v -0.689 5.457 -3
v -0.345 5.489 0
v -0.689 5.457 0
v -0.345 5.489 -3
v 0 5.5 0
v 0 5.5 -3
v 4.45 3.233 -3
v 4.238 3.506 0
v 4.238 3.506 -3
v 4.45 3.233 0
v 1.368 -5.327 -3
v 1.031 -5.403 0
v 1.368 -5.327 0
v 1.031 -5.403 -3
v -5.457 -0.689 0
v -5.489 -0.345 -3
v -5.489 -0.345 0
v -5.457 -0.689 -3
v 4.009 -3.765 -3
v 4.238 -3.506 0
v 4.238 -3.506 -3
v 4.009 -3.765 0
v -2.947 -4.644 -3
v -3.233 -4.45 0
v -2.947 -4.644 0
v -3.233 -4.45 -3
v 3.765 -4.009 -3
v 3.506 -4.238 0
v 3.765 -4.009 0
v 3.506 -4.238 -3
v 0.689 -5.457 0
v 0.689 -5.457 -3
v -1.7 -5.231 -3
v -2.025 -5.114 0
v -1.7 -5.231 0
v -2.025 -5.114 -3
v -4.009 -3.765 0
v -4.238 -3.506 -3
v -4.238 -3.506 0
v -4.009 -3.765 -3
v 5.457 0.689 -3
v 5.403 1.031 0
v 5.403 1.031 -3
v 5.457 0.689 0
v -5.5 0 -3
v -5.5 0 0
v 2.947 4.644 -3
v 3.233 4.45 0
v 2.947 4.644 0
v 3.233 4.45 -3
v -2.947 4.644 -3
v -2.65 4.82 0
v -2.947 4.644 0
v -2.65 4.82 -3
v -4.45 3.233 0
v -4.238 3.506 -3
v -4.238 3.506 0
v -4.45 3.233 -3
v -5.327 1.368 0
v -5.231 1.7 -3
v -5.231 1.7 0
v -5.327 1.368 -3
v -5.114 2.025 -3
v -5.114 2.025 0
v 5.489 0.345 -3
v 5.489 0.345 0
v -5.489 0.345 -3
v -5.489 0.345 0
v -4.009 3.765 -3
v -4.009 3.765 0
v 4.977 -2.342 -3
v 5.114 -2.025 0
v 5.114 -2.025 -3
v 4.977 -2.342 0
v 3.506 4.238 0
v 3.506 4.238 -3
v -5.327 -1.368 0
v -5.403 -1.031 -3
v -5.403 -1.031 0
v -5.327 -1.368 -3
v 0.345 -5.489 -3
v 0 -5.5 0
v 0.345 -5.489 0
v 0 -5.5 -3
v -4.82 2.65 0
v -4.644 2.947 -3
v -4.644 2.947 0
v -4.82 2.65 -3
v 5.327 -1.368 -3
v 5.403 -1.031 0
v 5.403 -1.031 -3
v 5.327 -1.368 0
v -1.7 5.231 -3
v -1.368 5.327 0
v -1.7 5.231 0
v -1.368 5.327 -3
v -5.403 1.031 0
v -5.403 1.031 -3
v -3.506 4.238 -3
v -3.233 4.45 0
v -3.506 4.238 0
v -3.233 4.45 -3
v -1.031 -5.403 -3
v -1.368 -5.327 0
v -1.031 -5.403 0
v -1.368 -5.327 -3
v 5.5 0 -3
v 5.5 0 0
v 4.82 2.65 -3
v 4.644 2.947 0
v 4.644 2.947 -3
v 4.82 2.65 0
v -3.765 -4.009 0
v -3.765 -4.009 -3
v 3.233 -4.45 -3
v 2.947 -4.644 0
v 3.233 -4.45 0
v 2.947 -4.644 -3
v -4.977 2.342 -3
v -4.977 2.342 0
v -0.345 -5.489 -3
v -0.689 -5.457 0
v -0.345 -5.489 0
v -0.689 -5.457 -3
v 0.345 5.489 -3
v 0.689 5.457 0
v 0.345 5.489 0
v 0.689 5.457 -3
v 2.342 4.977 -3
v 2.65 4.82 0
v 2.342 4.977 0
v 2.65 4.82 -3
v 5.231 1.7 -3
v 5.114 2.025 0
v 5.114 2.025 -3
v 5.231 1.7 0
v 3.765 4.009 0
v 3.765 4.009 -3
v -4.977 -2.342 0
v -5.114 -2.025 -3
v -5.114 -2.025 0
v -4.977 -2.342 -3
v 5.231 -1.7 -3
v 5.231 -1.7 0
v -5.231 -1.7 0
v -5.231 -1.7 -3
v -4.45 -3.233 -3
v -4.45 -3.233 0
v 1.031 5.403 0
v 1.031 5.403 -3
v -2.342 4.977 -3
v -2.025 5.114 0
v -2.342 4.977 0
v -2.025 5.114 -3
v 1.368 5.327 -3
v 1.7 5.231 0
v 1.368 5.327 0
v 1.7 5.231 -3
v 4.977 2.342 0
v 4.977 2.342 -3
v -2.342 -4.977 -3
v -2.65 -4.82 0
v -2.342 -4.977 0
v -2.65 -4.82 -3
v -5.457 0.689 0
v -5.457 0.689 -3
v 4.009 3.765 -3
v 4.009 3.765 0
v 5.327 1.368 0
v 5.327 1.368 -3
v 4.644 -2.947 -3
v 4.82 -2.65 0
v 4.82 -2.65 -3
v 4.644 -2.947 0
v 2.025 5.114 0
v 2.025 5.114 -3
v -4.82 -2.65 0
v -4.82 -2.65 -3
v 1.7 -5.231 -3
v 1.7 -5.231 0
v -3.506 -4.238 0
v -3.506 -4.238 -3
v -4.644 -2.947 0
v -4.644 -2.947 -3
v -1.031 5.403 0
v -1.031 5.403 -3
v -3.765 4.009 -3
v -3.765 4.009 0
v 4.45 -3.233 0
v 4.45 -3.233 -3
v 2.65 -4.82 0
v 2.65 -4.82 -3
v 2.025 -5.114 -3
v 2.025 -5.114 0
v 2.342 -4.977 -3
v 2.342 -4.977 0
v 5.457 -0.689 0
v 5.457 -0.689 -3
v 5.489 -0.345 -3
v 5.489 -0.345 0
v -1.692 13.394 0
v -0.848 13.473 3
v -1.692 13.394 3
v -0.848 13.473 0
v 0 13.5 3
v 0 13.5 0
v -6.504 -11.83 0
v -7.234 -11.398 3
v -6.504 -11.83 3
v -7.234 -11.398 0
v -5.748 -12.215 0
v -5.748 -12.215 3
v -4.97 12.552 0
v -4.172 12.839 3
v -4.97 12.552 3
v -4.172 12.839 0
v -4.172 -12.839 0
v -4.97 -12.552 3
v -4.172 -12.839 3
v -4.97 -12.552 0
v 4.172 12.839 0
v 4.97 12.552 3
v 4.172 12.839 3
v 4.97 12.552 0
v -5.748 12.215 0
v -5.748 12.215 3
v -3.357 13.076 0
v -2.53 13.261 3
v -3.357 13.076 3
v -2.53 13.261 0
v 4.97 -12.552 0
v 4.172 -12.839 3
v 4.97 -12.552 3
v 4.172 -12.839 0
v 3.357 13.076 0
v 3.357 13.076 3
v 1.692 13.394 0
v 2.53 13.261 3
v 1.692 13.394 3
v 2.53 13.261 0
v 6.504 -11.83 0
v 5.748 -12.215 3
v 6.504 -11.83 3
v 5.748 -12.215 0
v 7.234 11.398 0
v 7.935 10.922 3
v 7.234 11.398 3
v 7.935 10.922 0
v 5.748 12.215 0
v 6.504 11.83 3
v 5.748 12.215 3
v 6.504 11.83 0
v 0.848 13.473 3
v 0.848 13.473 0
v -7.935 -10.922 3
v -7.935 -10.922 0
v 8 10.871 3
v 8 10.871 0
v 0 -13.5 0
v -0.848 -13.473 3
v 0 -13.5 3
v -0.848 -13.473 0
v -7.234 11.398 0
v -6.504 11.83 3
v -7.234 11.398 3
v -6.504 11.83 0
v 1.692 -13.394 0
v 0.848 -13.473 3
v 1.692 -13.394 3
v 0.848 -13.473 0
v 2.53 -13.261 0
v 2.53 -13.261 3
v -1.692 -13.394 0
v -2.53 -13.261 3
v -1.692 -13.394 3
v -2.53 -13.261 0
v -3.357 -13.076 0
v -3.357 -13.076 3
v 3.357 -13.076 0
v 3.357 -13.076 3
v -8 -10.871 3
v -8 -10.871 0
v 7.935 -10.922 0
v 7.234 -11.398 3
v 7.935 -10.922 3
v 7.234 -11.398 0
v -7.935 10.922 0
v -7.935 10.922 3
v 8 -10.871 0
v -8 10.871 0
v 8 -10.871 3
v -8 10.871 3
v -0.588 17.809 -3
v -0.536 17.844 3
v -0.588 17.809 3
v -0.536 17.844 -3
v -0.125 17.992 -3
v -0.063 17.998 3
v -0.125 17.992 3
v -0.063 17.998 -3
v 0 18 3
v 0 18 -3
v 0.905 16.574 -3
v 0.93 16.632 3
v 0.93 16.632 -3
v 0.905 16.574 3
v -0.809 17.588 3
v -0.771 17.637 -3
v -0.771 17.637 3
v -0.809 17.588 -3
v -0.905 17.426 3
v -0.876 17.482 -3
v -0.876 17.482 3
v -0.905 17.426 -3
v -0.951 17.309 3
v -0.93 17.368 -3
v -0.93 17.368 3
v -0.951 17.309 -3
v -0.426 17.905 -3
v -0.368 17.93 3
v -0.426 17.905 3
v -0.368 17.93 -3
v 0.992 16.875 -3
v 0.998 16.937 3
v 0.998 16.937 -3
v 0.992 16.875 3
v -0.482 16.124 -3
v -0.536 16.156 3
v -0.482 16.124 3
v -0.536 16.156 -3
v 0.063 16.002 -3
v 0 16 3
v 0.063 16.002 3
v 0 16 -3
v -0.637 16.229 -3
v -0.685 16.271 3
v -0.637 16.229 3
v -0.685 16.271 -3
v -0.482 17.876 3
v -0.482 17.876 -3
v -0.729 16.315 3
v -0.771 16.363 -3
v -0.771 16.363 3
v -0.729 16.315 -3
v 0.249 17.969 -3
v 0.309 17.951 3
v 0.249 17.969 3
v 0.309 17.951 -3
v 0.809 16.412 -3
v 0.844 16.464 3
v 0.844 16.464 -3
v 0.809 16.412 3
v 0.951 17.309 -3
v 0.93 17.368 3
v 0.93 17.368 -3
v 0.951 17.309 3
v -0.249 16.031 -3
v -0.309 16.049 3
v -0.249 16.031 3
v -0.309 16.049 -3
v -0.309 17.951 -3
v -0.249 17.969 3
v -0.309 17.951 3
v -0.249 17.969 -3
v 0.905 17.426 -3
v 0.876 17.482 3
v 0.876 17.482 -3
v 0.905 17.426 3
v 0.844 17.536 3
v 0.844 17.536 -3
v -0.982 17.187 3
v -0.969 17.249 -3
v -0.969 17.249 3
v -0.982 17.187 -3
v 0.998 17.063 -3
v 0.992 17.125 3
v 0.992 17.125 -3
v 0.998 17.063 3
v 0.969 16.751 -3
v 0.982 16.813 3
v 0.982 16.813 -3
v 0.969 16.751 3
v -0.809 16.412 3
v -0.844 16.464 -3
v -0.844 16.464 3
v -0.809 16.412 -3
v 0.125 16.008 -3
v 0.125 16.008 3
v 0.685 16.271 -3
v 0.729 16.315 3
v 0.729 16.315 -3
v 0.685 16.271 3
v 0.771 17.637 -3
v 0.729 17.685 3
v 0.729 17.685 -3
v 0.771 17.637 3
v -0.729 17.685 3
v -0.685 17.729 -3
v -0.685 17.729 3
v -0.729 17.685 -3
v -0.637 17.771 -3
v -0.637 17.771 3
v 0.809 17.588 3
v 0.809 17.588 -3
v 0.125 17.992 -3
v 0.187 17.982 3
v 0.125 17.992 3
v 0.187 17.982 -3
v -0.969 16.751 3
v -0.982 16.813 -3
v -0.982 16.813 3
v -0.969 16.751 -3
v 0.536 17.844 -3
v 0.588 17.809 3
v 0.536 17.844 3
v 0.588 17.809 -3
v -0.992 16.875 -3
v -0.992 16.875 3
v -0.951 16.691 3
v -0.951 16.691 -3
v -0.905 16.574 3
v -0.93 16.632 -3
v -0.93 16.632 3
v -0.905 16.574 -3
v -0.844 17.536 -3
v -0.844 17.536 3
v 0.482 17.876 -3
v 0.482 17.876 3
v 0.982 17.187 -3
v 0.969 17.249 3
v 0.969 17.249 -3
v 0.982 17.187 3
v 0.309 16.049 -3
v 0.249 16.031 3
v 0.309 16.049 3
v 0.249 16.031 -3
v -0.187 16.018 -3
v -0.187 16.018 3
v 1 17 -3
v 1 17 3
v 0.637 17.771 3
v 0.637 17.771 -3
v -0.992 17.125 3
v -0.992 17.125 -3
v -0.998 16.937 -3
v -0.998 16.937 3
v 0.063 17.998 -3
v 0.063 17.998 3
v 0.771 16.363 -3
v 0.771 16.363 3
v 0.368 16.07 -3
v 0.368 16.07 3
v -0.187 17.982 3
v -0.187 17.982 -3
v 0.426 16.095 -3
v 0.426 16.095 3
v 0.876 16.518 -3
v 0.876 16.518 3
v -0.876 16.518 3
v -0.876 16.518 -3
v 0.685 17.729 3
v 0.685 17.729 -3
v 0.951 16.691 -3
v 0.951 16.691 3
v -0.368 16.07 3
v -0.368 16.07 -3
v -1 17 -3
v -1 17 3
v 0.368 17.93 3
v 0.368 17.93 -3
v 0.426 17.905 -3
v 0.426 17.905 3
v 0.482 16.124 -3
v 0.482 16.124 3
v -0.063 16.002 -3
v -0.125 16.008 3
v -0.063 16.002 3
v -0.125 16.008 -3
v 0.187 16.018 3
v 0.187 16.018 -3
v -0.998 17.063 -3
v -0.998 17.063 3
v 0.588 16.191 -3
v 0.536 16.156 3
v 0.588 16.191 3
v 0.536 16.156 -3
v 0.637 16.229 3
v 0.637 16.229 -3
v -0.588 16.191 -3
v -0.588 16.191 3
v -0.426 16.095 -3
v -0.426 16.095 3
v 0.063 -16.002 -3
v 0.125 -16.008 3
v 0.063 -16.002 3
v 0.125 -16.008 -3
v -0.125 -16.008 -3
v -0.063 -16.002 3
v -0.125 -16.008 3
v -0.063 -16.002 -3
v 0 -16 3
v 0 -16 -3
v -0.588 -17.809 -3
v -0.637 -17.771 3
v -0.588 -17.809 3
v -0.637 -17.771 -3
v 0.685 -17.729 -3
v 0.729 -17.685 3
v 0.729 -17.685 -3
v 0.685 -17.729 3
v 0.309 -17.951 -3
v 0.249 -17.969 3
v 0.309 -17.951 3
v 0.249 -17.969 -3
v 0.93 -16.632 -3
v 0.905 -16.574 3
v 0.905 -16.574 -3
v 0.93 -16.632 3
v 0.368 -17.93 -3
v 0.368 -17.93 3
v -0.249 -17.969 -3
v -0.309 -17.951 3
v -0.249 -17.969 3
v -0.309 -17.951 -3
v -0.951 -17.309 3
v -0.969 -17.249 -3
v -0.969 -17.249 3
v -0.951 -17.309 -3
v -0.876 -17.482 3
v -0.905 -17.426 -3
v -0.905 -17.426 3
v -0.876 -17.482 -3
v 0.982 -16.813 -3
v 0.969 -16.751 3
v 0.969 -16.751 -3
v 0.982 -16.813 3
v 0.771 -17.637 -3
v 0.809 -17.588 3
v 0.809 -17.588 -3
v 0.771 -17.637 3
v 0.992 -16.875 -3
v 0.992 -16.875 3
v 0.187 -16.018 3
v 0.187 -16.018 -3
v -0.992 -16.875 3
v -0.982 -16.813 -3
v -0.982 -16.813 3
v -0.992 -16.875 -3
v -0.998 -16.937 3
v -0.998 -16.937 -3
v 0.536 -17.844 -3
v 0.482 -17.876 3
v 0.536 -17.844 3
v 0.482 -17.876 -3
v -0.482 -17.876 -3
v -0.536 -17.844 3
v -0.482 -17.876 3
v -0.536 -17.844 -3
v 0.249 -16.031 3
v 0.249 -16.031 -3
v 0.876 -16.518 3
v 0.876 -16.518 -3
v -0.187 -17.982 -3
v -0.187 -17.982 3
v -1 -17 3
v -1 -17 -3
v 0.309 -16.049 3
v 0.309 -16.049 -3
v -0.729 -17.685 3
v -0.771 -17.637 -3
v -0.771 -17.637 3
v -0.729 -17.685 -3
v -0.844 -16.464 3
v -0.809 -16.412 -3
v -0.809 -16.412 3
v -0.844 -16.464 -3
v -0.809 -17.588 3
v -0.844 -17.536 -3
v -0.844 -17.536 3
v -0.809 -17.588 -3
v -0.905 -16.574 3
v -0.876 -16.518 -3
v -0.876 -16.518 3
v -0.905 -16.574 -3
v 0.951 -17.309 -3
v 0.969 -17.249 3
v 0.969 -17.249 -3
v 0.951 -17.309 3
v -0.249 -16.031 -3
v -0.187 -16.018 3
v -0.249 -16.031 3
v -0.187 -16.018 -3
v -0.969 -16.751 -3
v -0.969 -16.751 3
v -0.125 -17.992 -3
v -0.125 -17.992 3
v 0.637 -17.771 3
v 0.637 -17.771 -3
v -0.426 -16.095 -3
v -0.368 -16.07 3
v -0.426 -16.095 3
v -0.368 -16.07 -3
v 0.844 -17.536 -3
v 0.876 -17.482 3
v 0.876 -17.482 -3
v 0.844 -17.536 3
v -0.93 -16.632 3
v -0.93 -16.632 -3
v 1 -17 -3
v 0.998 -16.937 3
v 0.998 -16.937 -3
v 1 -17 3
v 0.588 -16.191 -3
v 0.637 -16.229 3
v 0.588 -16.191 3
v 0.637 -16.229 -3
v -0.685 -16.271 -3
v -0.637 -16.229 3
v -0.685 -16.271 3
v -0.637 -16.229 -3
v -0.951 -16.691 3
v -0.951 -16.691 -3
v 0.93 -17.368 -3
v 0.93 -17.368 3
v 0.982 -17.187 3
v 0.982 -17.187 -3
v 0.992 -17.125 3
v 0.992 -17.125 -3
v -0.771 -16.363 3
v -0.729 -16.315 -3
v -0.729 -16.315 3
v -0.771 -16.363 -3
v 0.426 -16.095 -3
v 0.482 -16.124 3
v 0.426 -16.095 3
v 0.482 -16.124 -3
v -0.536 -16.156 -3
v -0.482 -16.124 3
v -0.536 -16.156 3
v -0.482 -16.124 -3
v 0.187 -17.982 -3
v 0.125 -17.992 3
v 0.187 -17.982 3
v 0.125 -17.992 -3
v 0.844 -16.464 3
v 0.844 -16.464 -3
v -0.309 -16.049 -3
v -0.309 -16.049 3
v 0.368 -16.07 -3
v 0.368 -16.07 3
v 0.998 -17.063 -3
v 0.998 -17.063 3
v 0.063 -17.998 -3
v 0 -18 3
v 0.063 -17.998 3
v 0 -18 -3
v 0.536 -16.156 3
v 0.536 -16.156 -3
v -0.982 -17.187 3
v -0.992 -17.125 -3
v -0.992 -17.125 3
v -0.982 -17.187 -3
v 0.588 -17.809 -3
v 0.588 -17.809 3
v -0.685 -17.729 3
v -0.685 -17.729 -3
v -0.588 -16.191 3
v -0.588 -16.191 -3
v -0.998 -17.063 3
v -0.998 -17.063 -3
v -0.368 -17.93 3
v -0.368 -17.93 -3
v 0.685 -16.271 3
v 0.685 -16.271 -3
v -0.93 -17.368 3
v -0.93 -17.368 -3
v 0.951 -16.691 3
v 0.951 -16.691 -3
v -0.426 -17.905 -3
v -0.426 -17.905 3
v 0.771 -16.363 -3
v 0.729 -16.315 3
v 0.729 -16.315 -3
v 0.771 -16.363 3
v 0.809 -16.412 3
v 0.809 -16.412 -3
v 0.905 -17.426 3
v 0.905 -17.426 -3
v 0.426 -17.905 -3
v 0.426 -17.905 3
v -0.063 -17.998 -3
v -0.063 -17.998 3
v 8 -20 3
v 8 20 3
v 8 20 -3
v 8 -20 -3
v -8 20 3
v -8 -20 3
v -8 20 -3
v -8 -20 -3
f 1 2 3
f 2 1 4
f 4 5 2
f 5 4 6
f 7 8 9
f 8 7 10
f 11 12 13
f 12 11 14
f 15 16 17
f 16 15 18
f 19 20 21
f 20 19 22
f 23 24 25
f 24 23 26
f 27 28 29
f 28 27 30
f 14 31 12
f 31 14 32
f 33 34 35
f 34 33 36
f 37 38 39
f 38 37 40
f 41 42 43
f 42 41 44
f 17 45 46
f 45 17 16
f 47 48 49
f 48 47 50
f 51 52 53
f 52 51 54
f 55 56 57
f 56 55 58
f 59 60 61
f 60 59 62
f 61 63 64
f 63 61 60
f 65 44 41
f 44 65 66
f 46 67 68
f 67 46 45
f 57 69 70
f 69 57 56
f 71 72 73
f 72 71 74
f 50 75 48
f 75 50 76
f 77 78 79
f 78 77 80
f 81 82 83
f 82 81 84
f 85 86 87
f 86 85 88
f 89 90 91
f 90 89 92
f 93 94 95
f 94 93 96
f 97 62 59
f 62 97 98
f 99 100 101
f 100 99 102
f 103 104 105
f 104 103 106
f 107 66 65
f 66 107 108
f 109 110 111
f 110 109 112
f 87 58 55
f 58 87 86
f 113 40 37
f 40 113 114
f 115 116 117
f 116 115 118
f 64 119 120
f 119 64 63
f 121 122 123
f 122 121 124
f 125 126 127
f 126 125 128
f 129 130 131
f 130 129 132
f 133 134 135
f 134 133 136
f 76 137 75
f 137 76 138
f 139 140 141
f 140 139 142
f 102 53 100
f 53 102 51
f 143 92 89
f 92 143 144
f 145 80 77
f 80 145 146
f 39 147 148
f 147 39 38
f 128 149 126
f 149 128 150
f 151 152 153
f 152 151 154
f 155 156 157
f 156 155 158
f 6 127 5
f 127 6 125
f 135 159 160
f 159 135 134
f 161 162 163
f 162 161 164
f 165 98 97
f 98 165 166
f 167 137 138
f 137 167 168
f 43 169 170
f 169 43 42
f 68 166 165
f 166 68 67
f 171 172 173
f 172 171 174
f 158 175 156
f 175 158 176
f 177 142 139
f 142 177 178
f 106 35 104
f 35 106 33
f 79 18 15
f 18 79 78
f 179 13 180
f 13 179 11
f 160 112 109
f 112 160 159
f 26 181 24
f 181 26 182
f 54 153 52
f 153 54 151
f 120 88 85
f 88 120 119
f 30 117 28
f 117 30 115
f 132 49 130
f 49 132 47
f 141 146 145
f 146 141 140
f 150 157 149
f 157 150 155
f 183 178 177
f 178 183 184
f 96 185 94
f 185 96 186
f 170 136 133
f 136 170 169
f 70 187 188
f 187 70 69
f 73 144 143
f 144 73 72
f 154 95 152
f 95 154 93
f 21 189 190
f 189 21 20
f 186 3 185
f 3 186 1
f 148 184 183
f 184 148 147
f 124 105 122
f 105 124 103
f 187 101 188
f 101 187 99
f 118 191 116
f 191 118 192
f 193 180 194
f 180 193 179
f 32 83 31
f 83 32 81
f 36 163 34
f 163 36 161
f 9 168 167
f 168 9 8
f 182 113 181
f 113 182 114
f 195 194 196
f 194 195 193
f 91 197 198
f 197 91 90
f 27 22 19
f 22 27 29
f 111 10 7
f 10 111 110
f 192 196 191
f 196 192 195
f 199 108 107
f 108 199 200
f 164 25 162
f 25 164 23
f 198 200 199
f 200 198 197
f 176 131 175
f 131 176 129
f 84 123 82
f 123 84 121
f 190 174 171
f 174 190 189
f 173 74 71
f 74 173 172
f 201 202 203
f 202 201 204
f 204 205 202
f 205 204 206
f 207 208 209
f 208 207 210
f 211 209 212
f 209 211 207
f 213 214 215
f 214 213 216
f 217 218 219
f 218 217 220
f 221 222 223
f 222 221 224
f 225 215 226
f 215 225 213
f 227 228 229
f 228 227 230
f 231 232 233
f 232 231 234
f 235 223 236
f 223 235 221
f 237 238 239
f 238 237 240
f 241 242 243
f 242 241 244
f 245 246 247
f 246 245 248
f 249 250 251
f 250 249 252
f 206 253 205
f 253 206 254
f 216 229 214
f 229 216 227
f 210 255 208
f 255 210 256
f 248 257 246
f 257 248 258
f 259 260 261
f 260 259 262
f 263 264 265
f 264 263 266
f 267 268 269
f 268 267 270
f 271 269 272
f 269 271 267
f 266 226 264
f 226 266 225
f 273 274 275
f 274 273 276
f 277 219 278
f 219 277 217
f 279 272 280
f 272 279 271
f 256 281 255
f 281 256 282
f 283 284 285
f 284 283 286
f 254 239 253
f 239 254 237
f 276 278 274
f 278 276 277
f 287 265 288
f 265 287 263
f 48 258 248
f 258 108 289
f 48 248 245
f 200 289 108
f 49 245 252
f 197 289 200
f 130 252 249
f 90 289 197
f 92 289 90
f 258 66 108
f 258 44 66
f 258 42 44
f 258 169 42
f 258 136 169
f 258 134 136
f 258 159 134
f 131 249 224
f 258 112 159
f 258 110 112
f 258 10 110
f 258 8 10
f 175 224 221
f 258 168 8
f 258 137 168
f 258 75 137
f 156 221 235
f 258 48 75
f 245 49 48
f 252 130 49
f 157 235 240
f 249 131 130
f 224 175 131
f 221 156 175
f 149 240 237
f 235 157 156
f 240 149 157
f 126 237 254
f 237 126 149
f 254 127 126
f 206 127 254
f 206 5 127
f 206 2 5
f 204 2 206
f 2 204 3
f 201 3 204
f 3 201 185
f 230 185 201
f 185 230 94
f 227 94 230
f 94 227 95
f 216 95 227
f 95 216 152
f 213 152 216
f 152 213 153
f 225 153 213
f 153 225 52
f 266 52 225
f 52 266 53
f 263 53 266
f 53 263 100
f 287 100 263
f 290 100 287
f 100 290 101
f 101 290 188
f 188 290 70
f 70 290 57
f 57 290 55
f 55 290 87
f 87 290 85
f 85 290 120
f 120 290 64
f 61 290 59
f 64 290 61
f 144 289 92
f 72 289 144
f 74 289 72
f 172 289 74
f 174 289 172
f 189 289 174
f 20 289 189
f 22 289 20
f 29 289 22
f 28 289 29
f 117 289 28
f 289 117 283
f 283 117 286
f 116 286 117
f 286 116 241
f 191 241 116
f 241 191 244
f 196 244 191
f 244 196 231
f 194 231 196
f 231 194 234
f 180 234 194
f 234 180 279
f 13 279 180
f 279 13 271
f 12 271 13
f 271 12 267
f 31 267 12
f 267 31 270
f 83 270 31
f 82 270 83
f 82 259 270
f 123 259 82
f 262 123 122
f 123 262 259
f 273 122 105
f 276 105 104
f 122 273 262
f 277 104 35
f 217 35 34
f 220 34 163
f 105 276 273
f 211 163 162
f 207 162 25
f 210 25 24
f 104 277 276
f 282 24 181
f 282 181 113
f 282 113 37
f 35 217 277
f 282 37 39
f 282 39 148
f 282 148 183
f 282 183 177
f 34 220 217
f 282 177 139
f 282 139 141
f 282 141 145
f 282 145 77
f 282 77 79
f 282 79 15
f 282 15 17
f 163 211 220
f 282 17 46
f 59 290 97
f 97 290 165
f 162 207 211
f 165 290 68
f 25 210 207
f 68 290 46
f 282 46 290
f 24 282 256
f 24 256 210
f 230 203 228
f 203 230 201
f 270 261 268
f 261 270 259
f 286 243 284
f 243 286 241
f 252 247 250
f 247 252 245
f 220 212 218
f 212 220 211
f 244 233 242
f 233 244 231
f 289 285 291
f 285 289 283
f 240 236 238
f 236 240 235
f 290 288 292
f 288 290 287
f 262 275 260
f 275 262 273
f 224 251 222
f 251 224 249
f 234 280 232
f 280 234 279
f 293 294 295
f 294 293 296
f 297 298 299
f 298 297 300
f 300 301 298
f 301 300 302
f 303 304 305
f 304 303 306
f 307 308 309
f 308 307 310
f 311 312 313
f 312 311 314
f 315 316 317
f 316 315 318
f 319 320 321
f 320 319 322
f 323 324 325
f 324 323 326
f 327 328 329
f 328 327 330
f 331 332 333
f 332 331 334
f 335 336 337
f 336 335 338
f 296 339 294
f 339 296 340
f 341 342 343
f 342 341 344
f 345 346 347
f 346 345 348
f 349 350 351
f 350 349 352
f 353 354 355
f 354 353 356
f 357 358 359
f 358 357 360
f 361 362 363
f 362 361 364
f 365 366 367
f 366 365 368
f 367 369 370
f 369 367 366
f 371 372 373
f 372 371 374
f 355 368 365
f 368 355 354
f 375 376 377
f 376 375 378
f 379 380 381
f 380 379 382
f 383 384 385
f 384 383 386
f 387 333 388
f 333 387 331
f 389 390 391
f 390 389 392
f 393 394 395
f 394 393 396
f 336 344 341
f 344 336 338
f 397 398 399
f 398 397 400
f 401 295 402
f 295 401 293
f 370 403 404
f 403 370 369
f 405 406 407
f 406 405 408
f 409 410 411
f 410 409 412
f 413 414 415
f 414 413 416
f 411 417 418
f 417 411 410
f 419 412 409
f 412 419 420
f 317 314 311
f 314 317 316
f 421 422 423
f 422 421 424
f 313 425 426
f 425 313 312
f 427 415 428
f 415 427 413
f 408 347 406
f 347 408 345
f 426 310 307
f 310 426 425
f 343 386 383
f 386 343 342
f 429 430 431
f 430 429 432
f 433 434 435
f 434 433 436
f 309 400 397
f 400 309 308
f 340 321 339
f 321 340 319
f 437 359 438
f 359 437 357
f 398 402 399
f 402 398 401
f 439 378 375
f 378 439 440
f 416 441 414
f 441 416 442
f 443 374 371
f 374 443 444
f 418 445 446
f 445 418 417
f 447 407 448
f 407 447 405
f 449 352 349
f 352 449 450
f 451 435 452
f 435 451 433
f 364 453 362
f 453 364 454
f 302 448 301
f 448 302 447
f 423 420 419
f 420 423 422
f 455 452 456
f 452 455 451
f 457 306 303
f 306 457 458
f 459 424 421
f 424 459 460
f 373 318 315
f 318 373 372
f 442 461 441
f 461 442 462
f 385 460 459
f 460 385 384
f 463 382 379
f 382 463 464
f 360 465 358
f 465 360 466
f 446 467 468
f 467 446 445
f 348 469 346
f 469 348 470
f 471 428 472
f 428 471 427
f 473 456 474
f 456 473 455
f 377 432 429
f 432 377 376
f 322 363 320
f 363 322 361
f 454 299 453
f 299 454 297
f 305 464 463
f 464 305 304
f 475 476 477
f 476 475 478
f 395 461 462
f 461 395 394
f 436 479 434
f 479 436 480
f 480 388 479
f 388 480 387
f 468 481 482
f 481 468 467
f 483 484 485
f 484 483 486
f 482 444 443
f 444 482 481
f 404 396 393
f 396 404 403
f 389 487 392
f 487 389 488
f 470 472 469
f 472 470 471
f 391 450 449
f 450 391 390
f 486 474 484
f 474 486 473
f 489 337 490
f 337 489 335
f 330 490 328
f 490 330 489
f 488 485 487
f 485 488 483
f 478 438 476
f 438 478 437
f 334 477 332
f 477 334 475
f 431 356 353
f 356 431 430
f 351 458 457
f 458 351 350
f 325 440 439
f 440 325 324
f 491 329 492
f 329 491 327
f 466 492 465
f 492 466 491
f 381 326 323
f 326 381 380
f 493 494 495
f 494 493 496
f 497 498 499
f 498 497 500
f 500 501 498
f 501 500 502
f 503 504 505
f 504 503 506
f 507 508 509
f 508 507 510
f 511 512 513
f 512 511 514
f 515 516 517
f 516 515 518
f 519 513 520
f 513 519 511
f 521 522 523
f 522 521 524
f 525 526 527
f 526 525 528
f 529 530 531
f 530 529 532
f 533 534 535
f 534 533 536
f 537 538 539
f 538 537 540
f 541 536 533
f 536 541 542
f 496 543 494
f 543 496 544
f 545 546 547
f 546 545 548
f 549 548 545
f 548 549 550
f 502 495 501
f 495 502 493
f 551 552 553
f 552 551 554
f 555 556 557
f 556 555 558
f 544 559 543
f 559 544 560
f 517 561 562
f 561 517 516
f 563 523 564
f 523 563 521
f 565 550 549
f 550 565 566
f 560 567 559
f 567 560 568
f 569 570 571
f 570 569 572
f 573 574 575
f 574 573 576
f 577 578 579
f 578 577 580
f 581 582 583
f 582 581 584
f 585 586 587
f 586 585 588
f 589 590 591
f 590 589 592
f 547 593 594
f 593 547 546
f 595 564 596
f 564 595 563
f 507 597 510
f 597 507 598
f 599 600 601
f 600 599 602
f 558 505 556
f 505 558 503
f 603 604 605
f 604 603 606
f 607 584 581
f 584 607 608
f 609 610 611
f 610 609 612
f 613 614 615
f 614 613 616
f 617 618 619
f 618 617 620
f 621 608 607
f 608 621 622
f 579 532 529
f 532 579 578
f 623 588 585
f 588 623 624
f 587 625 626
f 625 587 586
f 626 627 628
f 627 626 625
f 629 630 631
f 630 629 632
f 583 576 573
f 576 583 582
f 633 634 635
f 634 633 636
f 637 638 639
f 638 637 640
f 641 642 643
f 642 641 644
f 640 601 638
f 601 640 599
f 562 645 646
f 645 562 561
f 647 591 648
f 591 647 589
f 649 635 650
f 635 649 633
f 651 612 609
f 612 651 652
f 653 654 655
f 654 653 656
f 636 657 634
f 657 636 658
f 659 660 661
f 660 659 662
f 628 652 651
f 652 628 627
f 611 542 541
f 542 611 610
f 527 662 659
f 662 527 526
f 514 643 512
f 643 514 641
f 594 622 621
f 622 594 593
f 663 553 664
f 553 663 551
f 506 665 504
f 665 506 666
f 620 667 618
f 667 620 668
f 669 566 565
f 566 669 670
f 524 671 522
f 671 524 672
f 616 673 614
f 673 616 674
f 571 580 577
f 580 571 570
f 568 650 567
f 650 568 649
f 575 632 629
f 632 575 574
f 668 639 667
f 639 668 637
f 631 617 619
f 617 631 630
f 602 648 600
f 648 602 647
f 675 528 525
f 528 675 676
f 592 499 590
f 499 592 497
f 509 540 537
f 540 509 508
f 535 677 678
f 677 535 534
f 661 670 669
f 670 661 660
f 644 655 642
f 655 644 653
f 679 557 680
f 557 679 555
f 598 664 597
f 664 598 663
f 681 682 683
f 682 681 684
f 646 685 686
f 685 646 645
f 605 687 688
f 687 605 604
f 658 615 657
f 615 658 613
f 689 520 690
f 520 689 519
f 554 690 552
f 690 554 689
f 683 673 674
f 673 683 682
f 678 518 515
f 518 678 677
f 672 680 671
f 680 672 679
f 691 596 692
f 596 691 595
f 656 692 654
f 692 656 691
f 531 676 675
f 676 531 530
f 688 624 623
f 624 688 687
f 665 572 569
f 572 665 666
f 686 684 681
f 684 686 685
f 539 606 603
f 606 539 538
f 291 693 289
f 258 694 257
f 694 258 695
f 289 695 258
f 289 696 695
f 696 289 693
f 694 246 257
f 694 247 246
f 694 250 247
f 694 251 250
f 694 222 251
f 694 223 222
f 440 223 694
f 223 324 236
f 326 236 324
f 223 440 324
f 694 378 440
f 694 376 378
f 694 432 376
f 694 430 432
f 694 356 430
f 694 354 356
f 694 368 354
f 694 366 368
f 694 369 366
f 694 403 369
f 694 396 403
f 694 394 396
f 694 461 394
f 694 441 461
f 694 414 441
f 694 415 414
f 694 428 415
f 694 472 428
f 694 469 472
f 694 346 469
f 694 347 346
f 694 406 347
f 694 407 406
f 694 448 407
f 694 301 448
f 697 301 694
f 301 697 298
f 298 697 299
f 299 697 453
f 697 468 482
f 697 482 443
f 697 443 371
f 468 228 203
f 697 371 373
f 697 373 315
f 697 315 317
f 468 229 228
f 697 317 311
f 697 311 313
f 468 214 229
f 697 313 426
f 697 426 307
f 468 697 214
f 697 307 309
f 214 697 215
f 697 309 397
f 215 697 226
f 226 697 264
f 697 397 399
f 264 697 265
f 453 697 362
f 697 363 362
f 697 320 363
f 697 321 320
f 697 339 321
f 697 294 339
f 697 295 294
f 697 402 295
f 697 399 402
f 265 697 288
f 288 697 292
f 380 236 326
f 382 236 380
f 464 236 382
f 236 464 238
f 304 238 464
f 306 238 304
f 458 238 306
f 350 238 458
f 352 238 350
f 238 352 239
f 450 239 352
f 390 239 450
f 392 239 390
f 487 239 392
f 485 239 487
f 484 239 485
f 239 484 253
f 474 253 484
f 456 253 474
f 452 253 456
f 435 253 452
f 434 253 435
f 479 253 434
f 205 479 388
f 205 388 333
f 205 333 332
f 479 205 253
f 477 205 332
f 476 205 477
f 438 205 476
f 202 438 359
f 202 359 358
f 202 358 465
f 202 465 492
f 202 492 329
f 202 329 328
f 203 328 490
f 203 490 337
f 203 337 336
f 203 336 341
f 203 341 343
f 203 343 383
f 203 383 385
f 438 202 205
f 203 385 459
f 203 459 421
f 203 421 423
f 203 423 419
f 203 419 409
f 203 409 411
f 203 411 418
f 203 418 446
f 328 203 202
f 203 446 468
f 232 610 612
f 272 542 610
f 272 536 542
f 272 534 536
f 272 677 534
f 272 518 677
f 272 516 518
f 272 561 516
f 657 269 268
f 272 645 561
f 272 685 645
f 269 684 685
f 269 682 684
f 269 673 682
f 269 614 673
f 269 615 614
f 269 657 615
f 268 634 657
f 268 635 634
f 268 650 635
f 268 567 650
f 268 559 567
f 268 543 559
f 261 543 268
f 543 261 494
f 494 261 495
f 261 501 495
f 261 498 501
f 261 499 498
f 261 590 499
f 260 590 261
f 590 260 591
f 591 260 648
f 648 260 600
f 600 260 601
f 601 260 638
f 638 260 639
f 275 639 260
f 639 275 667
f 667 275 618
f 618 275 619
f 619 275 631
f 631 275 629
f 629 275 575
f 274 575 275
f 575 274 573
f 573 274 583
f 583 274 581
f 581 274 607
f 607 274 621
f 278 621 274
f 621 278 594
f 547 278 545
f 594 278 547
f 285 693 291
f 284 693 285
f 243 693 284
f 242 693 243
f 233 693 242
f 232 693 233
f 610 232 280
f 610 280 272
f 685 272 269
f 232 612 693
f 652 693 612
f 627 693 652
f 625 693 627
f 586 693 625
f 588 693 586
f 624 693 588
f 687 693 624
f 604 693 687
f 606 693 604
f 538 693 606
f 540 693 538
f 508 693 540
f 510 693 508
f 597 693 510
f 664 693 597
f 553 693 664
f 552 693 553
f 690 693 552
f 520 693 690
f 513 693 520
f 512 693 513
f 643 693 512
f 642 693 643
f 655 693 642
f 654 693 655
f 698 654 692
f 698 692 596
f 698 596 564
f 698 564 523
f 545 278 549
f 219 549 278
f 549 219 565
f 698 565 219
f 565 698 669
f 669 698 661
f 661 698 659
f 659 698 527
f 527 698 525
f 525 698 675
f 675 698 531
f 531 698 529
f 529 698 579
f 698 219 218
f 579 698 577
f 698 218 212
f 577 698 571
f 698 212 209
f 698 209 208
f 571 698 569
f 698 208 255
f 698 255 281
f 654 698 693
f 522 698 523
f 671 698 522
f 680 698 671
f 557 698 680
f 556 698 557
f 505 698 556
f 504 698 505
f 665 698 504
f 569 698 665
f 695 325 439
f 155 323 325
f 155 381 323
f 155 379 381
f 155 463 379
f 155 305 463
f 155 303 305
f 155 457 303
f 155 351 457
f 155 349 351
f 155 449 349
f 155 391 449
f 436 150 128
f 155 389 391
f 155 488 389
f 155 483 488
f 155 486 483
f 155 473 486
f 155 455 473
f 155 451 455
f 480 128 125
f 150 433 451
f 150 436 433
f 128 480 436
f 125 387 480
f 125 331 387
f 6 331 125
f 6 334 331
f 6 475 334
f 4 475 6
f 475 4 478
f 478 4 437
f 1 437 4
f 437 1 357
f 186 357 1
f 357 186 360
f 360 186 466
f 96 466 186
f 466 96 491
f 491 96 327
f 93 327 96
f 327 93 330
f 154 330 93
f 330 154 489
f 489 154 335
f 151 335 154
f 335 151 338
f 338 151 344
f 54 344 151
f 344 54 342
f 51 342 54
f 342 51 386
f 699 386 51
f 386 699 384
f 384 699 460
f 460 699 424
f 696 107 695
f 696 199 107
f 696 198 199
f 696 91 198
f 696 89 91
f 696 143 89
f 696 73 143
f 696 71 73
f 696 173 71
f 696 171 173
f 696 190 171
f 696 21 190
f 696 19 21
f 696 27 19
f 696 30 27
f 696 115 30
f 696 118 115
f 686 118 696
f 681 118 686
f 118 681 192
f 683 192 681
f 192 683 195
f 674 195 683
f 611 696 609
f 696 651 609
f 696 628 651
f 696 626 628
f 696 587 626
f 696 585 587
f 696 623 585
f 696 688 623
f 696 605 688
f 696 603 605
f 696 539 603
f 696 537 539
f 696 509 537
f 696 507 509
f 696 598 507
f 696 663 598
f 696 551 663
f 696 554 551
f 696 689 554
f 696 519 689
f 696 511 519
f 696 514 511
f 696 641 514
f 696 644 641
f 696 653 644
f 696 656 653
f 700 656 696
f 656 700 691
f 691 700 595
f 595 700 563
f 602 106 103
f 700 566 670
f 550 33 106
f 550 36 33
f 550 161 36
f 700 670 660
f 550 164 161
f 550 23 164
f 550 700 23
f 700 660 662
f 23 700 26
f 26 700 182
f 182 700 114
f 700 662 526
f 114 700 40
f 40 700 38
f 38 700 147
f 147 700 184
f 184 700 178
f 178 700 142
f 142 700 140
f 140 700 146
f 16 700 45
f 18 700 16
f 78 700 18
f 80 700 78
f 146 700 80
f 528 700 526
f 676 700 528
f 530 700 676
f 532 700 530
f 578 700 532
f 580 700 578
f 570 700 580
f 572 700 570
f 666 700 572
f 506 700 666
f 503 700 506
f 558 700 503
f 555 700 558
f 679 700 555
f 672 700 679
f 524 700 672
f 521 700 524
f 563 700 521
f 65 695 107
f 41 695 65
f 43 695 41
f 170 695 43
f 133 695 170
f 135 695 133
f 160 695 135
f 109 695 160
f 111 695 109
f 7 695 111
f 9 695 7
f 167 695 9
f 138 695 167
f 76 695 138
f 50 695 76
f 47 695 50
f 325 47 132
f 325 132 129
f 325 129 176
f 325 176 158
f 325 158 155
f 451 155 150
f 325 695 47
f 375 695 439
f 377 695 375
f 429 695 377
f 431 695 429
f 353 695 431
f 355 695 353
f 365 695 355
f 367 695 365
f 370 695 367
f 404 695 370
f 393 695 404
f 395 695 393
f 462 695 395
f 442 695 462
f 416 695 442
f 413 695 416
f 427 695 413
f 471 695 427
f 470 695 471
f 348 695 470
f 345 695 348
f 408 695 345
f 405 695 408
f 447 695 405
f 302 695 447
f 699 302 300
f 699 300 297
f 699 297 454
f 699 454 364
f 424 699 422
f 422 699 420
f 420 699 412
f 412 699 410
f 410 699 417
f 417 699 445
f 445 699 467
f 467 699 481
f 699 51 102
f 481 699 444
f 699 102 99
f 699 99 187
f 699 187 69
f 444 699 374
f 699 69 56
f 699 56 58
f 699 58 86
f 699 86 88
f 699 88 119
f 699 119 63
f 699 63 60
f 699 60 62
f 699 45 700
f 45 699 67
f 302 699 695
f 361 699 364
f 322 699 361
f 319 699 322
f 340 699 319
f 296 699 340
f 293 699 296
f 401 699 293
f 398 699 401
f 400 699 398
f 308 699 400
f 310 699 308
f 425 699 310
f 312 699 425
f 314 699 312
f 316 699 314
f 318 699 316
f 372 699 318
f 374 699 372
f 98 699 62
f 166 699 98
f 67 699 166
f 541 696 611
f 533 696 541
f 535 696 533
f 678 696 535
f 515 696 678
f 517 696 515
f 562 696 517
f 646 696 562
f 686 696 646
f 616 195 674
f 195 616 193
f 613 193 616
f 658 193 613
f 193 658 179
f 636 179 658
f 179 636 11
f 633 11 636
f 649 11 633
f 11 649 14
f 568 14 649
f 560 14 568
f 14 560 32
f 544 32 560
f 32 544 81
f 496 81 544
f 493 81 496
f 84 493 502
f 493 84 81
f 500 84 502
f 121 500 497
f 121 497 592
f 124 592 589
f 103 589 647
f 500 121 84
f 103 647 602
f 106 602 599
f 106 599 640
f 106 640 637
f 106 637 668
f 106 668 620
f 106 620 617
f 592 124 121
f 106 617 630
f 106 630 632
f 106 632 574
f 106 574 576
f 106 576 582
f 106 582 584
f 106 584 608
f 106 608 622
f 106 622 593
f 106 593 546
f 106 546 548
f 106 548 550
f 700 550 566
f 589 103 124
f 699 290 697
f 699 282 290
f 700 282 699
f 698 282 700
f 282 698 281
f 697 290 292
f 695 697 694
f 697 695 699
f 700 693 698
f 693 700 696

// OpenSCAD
difference(){
	union(){
        
       translate([0,0,0]){
           cube([16,40,6], center=true);
       }
	}
	union() {
        
       translate([0,0,0]){
            rotate(a = [0,0,90]) {
              cylinder(h=600, r=5.5, $fn=100, center=true);
            }
       }			   
       translate([0,0,0]){
            rotate(a = [0,0,90]) {
              cylinder(h=600, r=13.5, $fn=100, center=false);
            }
       }			   
       translate([0,17,0]){
            rotate(a = [0,0,90]) {
              cylinder(h=600, r=1, $fn=100, center=true);
            }
       }			   
       translate([0,-17,0]){
            rotate(a = [0,0,90]) {
              cylinder(h=600, r=1, $fn=100, center=true);
            }
       }			   
		   

        
	}
}
